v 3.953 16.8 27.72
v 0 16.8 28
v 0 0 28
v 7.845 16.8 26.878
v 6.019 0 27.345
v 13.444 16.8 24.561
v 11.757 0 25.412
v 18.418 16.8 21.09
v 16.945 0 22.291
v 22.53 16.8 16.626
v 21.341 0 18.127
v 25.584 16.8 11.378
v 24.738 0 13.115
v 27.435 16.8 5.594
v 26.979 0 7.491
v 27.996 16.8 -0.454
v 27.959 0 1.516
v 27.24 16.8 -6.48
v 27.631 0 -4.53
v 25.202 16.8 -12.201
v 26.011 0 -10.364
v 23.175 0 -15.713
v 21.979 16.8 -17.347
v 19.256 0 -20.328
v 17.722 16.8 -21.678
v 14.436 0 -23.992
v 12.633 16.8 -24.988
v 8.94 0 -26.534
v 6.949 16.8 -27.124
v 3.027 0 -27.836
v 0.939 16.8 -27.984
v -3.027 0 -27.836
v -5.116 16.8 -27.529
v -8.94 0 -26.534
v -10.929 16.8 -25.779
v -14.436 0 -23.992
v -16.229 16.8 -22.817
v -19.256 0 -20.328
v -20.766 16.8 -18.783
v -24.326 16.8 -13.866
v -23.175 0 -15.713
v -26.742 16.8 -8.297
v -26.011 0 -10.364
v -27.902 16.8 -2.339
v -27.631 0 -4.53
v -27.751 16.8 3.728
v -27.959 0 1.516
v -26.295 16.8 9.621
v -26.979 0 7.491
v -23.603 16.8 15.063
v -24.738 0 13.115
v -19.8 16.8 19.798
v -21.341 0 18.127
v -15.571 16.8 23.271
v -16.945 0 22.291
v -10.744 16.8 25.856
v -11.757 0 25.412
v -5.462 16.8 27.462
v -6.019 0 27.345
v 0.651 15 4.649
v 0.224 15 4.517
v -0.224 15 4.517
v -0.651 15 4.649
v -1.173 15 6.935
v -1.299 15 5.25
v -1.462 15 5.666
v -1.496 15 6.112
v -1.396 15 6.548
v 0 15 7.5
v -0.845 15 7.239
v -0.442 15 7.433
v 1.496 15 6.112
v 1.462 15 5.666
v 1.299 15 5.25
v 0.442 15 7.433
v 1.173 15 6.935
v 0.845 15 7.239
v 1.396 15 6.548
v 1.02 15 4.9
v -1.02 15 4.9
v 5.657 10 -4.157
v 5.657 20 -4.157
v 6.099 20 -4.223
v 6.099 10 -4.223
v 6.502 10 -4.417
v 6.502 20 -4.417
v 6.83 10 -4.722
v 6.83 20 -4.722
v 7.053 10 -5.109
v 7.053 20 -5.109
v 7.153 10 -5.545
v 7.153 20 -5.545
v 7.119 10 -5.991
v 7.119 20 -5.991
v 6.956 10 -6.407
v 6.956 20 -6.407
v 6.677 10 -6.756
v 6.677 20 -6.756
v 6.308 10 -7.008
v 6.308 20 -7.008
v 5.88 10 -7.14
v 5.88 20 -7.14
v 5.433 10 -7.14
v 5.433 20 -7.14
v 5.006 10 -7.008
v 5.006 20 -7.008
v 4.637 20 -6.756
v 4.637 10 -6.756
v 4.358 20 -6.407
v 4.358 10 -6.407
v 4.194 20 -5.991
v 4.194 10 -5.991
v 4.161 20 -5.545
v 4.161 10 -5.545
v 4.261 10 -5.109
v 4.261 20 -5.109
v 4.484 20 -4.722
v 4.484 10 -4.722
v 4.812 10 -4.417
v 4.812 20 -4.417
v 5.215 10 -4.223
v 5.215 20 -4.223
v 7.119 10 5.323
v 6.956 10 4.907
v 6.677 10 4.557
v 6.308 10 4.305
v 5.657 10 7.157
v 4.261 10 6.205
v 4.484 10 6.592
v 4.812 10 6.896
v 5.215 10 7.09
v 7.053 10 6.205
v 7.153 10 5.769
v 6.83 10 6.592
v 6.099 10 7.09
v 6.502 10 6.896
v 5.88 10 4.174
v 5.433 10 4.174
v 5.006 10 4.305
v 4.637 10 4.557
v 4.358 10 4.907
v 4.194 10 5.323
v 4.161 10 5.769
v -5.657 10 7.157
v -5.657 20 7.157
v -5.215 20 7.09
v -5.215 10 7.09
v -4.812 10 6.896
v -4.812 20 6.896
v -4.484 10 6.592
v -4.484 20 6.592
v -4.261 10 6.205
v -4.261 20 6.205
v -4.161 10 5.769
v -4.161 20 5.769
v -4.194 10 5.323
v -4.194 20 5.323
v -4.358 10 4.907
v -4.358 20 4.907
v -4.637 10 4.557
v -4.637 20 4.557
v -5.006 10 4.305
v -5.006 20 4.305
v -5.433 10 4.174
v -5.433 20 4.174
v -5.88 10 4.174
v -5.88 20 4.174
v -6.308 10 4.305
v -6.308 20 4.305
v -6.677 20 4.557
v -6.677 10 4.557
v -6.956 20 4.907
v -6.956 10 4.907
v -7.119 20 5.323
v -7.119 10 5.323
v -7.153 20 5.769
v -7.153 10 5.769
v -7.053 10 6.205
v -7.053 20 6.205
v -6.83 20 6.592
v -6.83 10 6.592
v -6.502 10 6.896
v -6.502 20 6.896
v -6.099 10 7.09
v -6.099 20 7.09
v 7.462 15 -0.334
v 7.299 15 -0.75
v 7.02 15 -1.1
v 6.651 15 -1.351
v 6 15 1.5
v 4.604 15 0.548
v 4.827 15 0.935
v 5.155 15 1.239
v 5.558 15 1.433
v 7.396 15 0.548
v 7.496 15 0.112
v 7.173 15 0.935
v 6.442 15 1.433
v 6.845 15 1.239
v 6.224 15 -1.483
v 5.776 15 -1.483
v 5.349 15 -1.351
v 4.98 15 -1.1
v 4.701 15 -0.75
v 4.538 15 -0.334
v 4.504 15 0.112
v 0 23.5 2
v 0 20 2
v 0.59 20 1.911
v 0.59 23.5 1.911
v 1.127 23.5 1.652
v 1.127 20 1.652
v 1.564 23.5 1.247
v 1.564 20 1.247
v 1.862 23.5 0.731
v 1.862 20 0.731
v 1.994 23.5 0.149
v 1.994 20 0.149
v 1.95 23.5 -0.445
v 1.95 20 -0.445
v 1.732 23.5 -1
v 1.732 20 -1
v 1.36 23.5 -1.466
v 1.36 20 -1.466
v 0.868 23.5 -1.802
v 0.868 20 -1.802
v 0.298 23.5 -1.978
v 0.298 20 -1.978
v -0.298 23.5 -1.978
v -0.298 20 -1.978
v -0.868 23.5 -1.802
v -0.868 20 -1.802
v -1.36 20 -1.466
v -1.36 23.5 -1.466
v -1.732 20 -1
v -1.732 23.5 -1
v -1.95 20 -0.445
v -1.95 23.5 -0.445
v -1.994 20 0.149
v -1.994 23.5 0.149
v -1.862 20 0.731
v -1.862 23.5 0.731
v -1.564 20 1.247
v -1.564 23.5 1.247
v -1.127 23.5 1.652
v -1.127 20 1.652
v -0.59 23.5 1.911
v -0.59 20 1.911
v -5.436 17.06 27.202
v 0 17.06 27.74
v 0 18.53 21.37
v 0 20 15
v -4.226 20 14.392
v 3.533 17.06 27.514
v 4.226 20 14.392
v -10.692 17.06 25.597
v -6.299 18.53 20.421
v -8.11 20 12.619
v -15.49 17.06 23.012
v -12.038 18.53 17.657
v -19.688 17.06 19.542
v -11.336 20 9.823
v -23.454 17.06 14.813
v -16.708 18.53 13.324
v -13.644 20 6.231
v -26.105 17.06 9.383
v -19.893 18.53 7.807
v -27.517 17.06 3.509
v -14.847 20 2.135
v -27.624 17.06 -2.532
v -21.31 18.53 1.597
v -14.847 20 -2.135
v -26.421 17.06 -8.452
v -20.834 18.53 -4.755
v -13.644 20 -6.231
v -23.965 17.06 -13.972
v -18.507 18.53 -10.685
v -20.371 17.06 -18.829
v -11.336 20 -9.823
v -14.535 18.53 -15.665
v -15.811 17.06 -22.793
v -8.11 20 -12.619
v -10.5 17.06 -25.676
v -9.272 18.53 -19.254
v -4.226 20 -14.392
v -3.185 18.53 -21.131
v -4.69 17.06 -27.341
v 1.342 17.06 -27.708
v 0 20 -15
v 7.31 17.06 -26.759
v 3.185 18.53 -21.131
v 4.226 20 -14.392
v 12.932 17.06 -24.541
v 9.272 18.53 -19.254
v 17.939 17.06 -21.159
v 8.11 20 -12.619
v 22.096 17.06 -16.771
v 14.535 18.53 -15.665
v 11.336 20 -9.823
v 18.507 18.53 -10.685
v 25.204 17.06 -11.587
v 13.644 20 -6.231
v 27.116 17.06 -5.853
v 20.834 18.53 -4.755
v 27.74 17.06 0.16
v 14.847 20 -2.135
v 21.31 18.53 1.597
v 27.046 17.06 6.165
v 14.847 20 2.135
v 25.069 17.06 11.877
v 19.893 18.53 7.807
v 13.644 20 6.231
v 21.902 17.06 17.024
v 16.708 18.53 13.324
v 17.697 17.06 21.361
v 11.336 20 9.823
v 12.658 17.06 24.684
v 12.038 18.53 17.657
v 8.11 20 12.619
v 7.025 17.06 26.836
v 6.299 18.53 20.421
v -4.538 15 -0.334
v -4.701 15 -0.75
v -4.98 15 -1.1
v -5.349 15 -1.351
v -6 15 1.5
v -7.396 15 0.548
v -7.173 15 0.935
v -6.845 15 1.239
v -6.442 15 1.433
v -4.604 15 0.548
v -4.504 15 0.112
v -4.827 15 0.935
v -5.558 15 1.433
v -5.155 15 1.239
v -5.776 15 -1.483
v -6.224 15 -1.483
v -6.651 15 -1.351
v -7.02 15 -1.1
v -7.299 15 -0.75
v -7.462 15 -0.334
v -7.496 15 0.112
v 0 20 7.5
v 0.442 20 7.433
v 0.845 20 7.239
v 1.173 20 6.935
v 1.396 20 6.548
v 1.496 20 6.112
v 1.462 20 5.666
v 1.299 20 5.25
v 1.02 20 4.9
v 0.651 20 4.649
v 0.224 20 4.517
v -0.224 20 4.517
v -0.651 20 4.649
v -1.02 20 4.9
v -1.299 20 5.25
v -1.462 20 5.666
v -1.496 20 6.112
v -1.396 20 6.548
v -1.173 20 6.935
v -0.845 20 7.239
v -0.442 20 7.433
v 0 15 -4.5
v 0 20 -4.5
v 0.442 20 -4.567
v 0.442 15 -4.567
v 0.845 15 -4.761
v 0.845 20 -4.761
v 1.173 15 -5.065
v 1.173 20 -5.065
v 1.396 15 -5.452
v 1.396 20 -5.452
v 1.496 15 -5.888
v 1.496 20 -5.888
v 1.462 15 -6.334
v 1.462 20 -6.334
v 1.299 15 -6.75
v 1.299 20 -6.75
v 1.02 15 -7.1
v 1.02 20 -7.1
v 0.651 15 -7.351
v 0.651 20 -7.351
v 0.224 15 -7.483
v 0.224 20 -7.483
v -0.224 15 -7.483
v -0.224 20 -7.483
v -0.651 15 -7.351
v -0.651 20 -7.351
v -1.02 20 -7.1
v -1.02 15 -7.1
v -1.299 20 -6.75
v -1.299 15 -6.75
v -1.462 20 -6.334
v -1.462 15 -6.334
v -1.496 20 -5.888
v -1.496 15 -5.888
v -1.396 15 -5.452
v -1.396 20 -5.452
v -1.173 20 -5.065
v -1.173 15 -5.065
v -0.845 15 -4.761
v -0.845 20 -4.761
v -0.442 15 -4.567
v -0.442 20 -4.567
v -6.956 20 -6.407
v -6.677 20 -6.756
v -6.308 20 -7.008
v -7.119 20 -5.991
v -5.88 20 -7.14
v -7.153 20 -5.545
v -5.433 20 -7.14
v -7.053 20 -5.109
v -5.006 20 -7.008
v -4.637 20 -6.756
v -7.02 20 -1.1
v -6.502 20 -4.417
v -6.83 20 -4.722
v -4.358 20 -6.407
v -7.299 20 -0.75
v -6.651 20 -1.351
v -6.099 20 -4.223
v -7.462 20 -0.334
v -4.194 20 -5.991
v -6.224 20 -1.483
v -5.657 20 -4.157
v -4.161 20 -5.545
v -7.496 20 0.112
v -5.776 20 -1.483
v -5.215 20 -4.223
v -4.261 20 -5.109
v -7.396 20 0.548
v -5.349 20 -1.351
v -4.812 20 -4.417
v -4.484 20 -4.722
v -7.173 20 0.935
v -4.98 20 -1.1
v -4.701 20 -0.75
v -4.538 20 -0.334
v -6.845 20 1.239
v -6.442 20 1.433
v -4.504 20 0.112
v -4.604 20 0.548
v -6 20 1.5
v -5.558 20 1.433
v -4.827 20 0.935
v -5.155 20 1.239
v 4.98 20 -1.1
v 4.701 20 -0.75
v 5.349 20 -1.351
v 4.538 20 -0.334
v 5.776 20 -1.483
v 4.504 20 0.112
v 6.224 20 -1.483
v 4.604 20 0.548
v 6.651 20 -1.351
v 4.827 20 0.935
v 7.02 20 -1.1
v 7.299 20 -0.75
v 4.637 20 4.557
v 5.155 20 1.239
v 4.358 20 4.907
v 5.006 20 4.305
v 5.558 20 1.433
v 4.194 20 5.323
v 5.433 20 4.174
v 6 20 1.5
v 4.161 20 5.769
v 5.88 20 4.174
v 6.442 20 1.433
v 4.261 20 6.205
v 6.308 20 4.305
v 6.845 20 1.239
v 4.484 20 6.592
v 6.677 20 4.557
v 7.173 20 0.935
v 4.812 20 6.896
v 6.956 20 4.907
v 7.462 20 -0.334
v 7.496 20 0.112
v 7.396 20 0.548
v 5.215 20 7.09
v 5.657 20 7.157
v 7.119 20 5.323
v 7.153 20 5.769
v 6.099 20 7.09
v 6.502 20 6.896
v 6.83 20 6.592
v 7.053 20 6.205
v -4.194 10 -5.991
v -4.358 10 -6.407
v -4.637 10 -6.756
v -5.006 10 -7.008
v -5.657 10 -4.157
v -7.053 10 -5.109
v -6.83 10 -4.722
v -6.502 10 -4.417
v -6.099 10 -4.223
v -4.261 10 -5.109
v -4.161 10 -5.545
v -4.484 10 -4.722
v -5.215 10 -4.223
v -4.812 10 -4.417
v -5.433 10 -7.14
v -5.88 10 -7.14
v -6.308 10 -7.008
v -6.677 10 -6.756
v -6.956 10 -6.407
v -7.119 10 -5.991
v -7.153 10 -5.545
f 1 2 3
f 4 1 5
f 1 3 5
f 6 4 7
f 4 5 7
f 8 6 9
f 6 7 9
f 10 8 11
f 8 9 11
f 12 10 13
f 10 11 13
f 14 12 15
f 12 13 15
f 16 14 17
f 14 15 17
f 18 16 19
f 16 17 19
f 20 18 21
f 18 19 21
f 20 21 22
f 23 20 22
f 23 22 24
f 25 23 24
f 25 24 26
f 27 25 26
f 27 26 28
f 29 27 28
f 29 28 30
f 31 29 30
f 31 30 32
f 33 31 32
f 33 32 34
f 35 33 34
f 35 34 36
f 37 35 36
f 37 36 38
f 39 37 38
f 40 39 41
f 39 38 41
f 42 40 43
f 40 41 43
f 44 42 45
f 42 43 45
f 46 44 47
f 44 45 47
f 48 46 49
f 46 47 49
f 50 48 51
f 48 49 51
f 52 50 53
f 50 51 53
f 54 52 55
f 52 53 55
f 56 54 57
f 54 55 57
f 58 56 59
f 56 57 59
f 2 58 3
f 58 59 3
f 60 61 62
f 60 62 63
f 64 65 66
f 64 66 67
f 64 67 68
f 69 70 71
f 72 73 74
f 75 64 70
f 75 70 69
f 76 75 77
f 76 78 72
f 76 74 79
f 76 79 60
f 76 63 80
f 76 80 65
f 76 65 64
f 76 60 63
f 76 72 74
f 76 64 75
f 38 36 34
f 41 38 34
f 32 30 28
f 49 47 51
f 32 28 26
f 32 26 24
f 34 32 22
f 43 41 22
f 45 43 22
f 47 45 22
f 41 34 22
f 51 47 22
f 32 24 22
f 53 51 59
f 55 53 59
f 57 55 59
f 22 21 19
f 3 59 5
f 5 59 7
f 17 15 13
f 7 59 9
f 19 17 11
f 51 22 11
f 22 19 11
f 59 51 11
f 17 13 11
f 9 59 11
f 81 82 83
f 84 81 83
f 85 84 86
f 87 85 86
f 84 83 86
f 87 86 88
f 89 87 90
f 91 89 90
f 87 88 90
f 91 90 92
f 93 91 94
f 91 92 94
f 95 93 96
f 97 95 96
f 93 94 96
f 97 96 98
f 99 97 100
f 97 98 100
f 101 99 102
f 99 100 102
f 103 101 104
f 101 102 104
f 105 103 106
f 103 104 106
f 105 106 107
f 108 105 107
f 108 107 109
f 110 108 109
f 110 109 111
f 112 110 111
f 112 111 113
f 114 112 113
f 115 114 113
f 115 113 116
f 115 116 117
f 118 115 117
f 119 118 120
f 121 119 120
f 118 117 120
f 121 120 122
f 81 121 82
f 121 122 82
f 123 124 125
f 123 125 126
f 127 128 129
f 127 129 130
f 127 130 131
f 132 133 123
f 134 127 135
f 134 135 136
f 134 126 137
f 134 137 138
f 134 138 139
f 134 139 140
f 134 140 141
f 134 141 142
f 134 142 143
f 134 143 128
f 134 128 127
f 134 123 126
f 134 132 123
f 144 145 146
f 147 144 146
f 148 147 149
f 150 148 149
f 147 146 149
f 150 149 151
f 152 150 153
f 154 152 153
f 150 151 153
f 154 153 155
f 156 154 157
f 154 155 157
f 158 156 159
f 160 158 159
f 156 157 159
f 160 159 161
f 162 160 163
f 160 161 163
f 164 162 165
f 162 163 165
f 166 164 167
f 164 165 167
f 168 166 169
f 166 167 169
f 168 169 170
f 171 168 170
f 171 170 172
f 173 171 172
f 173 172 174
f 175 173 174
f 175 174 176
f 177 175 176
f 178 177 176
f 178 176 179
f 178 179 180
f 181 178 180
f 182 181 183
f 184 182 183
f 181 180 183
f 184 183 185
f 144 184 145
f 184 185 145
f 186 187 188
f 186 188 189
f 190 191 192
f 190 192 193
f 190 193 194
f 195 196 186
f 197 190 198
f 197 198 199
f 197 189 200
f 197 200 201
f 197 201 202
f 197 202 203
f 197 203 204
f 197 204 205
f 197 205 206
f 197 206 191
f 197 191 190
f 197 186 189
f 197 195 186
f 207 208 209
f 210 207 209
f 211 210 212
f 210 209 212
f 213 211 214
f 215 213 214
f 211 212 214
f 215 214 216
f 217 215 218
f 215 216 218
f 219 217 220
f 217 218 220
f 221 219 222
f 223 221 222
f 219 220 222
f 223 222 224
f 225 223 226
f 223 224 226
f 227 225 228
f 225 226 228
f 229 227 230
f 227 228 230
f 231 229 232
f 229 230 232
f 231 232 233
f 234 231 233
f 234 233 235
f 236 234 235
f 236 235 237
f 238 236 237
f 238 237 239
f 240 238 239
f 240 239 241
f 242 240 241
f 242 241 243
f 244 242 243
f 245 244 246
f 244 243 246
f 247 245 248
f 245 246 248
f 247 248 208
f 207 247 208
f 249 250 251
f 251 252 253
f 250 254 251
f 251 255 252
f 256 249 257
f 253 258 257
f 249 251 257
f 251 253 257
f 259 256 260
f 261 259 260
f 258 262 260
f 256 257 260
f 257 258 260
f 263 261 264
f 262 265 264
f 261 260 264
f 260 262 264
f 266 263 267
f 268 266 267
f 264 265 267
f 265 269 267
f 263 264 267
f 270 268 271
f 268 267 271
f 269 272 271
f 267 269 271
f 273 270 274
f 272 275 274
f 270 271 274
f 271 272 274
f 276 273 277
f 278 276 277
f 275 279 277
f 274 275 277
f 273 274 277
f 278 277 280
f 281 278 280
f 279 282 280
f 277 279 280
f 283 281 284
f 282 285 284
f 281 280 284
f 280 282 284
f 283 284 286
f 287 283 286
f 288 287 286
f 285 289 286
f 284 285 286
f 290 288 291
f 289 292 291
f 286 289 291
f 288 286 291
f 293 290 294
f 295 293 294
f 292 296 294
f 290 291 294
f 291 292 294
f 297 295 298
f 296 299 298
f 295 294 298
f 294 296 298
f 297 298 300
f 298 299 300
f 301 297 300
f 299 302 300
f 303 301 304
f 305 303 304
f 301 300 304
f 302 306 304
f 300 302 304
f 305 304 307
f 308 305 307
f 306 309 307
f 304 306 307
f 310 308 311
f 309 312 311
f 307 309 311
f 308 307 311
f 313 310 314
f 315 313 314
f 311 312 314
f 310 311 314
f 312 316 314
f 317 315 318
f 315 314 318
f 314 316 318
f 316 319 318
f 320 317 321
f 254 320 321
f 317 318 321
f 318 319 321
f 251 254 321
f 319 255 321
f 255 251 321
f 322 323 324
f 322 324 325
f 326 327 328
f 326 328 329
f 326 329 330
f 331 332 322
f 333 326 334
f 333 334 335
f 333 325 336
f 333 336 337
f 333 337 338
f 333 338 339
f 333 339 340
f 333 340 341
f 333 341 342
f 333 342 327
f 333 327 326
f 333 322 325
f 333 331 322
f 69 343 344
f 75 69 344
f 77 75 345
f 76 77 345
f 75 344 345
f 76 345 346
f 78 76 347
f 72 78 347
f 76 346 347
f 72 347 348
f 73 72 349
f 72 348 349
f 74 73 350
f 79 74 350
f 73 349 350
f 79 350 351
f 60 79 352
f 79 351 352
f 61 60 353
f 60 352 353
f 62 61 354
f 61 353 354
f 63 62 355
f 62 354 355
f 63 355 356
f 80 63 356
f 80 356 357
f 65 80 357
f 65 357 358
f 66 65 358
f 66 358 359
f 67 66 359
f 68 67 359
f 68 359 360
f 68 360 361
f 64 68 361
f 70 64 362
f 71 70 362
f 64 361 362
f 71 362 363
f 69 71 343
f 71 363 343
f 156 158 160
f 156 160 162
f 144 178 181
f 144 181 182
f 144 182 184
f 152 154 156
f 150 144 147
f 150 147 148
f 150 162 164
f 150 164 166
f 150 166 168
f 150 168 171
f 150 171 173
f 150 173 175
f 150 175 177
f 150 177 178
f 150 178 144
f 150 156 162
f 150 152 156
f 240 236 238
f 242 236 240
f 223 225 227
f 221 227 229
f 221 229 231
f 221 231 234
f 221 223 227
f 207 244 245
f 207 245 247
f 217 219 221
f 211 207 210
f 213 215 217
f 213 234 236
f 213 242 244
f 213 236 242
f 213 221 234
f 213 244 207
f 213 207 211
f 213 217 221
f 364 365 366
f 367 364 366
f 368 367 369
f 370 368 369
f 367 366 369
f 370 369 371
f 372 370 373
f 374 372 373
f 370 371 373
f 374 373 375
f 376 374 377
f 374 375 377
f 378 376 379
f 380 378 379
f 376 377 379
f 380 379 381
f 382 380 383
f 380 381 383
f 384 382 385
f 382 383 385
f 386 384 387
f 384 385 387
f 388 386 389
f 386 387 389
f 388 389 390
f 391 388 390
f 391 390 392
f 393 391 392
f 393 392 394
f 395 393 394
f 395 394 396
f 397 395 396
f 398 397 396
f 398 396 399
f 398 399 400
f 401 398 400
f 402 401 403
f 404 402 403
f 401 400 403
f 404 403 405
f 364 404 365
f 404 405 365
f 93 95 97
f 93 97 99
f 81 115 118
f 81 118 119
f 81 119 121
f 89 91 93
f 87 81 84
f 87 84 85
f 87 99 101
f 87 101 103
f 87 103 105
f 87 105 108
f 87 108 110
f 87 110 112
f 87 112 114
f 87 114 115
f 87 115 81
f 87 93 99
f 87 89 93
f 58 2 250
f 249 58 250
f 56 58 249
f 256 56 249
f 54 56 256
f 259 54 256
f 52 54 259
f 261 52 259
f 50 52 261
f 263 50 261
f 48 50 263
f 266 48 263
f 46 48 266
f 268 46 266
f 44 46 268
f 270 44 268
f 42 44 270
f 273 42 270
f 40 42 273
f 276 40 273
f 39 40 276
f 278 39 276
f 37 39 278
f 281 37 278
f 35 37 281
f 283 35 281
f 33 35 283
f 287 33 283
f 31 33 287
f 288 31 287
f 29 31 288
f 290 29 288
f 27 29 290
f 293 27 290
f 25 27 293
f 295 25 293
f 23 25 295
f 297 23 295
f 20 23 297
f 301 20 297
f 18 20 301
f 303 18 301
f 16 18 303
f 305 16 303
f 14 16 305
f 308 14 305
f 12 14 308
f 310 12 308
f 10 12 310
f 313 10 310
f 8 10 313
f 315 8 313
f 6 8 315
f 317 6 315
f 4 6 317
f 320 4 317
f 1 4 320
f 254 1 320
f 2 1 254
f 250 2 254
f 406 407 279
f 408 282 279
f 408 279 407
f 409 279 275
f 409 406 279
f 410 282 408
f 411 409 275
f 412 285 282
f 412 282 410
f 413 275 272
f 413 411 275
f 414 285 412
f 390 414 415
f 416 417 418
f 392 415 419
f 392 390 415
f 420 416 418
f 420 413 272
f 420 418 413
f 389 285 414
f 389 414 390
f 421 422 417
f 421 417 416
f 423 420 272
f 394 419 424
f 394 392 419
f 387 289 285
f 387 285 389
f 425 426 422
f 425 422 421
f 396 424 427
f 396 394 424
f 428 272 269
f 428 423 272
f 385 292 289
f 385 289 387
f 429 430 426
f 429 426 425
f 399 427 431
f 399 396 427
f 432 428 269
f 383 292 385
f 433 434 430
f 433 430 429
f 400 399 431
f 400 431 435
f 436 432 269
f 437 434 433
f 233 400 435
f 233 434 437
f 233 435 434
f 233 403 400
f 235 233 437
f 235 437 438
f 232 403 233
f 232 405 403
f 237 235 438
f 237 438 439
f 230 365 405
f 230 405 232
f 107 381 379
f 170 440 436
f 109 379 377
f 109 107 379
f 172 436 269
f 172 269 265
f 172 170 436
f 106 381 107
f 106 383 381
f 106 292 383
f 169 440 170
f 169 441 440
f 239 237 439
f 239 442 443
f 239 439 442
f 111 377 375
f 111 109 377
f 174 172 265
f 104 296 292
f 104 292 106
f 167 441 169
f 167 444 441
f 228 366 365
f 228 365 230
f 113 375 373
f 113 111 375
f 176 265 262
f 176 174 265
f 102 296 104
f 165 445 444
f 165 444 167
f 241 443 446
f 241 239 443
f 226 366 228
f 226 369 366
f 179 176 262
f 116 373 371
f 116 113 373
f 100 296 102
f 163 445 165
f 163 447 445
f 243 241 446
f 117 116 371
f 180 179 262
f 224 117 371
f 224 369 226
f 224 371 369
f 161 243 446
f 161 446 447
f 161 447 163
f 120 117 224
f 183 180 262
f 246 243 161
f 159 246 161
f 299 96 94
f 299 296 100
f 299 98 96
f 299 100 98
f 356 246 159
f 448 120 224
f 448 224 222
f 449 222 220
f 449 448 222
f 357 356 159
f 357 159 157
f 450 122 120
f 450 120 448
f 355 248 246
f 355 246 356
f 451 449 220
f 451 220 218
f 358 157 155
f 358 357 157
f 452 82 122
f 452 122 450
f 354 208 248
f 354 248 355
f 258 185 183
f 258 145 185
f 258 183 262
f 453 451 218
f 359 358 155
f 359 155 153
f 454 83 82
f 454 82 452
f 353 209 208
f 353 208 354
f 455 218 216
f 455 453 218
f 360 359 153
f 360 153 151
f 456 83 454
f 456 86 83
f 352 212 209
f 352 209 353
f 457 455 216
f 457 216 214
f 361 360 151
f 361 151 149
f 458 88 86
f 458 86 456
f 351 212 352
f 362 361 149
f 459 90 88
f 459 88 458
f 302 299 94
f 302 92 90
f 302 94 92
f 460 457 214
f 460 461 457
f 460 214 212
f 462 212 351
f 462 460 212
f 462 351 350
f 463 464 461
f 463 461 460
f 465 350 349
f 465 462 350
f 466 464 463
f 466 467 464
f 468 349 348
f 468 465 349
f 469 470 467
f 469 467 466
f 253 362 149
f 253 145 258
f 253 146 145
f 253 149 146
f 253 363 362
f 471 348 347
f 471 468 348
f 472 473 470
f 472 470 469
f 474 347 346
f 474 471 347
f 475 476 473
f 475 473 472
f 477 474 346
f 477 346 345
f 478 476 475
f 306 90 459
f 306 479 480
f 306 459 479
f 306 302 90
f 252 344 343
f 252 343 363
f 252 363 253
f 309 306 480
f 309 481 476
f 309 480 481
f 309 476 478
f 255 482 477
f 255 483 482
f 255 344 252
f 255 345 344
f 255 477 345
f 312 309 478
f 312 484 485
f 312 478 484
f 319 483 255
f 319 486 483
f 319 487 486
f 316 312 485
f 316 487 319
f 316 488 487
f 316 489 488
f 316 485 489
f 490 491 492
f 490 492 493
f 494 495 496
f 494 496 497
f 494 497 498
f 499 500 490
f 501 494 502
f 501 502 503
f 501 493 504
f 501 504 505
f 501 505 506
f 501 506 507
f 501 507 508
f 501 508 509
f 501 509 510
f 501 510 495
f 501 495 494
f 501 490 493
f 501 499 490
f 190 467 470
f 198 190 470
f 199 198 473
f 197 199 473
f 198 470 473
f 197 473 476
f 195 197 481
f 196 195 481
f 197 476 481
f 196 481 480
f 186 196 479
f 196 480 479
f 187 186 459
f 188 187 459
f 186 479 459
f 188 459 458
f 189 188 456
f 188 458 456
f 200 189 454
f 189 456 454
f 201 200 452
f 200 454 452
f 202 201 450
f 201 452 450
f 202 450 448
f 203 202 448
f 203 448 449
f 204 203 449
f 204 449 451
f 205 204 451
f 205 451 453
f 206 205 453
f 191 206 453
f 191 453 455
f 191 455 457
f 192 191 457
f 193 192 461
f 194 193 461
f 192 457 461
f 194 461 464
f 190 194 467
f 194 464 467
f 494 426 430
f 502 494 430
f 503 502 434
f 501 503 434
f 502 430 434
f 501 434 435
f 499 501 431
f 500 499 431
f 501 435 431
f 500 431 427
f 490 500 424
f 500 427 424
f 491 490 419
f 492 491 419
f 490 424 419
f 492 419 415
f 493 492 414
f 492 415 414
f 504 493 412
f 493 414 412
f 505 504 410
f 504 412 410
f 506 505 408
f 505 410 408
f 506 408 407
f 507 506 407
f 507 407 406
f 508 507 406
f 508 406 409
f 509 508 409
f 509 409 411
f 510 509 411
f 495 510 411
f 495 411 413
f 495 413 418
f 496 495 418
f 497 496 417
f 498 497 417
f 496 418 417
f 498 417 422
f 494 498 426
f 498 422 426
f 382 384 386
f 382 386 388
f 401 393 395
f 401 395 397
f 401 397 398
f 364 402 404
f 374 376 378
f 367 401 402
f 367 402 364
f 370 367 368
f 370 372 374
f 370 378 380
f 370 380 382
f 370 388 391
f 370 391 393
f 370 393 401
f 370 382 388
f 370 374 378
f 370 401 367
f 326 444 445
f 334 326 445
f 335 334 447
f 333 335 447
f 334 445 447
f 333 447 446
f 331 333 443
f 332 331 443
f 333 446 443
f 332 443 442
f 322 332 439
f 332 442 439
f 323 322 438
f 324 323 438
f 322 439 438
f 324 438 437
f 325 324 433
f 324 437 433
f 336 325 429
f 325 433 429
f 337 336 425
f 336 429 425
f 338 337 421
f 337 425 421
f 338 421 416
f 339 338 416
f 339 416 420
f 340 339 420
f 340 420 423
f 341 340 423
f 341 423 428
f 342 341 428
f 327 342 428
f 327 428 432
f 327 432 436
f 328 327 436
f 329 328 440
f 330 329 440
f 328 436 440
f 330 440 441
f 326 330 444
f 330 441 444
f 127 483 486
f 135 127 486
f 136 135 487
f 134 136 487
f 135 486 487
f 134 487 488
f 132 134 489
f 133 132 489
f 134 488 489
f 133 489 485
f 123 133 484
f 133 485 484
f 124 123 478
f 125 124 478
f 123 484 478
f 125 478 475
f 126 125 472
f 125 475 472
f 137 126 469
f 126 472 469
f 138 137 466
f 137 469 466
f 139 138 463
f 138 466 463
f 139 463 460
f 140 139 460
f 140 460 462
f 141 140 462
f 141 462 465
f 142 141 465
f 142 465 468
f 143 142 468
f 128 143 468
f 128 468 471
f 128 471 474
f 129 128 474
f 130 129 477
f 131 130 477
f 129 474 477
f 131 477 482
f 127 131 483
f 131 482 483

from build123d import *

# Parameters (mm, degrees)
ESQUISSE1_R             = 28
BOSS_EXTRU_1_DEPTH      = 20
CHANFREIN1_SIZE         = 0.2
CHANFREIN1_SIZE2        = 0.266833281
ESQUISSE3_R             = 2
BOSS_EXTRU_2_DEPTH      = 3.5
ESQUISSE4_R             = 1.5
ENL_V_MAT_EXTRU_1_DEPTH = 5
ESQUISSE5_R             = 1.5
ENL_V_MAT_EXTRU_2_DEPTH = 10


with BuildPart() as part:
    # Esquisse1 → Boss.-Extru.1 (new body)
    with BuildSketch(Plane(origin=(0, 0, 0), x_dir=(1, 0, 0), z_dir=(0, 1, 0))):
        with Locations(Location((0, 0, 0), (0, 0, 270))):
            Circle(ESQUISSE1_R)
    extrude(amount=BOSS_EXTRU_1_DEPTH)

    # Esquisse2 → Enlèvement de matière-Révolution1 (revolve, cut)
    with BuildSketch(Plane(origin=(0, 0, 0), x_dir=(0, 0, -1), z_dir=(1, 0, 0))):
        Polygon((-28, 20), (-28, 17), (-15, 20), align=None)
    revolve(axis=Axis((0, 20, 0), (0, -1, 0)), mode=Mode.SUBTRACT)

    # Chanfrein1
    chanfrein1_edges = [part.edges().sort_by_distance(p)[0] for p in [
        (0, 17, -28),
    ]]
    chanfrein1_side = [part.faces().sort_by_distance(p)[0] for p in [
        (0, 8.5, -28),
    ]]
    chamfer(chanfrein1_edges, length=CHANFREIN1_SIZE, length2=CHANFREIN1_SIZE2, reference=chanfrein1_side[0])

    # Esquisse3 → Boss.-Extru.2 (add)
    with BuildSketch(Plane(origin=(0, 20, 0), x_dir=(1, 0, 0), z_dir=(0, 1, 0))):
        with Locations(Location((0, 0, 0), (0, 0, 270))):
            Circle(ESQUISSE3_R)
    extrude(amount=BOSS_EXTRU_2_DEPTH)

    # Esquisse4 → Enlèv. mat.-Extru.1 (cut)
    with BuildSketch(Plane(origin=(0, 20, 0), x_dir=(1, 0, 0), z_dir=(0, 1, 0))):
        with Locations(Location((0, 6, 0), (0, 0, 270))):
            Circle(ESQUISSE4_R)
        with Locations(Location((6, 0, 0), (0, 0, 270))):
            Circle(ESQUISSE4_R)
        with Locations(Location((0, -6, 0), (0, 0, 270))):
            Circle(ESQUISSE4_R)
        with Locations(Location((-6, 0, 0), (0, 0, 270))):
            Circle(ESQUISSE4_R)
    extrude(amount=-ENL_V_MAT_EXTRU_1_DEPTH, mode=Mode.SUBTRACT)

    # Esquisse5 → Enlèv. mat.-Extru.2 (cut)
    with BuildSketch(Plane(origin=(0, 20, 0), x_dir=(1, 0, 0), z_dir=(0, 1, 0))):
        with Locations(Location((-5.656854249, 5.656854249, 0), (0, 0, 270))):
            Circle(ESQUISSE5_R)
        with Locations(Location((5.656854249, 5.656854249, 0), (0, 0, 270))):
            Circle(ESQUISSE5_R)
        with Locations(Location((5.656854249, -5.656854249, 0), (0, 0, 270))):
            Circle(ESQUISSE5_R)
        with Locations(Location((-5.656854249, -5.656854249, 0), (0, 0, 270))):
            Circle(ESQUISSE5_R)
    extrude(amount=-ENL_V_MAT_EXTRU_2_DEPTH, mode=Mode.SUBTRACT)


solid = part.part
